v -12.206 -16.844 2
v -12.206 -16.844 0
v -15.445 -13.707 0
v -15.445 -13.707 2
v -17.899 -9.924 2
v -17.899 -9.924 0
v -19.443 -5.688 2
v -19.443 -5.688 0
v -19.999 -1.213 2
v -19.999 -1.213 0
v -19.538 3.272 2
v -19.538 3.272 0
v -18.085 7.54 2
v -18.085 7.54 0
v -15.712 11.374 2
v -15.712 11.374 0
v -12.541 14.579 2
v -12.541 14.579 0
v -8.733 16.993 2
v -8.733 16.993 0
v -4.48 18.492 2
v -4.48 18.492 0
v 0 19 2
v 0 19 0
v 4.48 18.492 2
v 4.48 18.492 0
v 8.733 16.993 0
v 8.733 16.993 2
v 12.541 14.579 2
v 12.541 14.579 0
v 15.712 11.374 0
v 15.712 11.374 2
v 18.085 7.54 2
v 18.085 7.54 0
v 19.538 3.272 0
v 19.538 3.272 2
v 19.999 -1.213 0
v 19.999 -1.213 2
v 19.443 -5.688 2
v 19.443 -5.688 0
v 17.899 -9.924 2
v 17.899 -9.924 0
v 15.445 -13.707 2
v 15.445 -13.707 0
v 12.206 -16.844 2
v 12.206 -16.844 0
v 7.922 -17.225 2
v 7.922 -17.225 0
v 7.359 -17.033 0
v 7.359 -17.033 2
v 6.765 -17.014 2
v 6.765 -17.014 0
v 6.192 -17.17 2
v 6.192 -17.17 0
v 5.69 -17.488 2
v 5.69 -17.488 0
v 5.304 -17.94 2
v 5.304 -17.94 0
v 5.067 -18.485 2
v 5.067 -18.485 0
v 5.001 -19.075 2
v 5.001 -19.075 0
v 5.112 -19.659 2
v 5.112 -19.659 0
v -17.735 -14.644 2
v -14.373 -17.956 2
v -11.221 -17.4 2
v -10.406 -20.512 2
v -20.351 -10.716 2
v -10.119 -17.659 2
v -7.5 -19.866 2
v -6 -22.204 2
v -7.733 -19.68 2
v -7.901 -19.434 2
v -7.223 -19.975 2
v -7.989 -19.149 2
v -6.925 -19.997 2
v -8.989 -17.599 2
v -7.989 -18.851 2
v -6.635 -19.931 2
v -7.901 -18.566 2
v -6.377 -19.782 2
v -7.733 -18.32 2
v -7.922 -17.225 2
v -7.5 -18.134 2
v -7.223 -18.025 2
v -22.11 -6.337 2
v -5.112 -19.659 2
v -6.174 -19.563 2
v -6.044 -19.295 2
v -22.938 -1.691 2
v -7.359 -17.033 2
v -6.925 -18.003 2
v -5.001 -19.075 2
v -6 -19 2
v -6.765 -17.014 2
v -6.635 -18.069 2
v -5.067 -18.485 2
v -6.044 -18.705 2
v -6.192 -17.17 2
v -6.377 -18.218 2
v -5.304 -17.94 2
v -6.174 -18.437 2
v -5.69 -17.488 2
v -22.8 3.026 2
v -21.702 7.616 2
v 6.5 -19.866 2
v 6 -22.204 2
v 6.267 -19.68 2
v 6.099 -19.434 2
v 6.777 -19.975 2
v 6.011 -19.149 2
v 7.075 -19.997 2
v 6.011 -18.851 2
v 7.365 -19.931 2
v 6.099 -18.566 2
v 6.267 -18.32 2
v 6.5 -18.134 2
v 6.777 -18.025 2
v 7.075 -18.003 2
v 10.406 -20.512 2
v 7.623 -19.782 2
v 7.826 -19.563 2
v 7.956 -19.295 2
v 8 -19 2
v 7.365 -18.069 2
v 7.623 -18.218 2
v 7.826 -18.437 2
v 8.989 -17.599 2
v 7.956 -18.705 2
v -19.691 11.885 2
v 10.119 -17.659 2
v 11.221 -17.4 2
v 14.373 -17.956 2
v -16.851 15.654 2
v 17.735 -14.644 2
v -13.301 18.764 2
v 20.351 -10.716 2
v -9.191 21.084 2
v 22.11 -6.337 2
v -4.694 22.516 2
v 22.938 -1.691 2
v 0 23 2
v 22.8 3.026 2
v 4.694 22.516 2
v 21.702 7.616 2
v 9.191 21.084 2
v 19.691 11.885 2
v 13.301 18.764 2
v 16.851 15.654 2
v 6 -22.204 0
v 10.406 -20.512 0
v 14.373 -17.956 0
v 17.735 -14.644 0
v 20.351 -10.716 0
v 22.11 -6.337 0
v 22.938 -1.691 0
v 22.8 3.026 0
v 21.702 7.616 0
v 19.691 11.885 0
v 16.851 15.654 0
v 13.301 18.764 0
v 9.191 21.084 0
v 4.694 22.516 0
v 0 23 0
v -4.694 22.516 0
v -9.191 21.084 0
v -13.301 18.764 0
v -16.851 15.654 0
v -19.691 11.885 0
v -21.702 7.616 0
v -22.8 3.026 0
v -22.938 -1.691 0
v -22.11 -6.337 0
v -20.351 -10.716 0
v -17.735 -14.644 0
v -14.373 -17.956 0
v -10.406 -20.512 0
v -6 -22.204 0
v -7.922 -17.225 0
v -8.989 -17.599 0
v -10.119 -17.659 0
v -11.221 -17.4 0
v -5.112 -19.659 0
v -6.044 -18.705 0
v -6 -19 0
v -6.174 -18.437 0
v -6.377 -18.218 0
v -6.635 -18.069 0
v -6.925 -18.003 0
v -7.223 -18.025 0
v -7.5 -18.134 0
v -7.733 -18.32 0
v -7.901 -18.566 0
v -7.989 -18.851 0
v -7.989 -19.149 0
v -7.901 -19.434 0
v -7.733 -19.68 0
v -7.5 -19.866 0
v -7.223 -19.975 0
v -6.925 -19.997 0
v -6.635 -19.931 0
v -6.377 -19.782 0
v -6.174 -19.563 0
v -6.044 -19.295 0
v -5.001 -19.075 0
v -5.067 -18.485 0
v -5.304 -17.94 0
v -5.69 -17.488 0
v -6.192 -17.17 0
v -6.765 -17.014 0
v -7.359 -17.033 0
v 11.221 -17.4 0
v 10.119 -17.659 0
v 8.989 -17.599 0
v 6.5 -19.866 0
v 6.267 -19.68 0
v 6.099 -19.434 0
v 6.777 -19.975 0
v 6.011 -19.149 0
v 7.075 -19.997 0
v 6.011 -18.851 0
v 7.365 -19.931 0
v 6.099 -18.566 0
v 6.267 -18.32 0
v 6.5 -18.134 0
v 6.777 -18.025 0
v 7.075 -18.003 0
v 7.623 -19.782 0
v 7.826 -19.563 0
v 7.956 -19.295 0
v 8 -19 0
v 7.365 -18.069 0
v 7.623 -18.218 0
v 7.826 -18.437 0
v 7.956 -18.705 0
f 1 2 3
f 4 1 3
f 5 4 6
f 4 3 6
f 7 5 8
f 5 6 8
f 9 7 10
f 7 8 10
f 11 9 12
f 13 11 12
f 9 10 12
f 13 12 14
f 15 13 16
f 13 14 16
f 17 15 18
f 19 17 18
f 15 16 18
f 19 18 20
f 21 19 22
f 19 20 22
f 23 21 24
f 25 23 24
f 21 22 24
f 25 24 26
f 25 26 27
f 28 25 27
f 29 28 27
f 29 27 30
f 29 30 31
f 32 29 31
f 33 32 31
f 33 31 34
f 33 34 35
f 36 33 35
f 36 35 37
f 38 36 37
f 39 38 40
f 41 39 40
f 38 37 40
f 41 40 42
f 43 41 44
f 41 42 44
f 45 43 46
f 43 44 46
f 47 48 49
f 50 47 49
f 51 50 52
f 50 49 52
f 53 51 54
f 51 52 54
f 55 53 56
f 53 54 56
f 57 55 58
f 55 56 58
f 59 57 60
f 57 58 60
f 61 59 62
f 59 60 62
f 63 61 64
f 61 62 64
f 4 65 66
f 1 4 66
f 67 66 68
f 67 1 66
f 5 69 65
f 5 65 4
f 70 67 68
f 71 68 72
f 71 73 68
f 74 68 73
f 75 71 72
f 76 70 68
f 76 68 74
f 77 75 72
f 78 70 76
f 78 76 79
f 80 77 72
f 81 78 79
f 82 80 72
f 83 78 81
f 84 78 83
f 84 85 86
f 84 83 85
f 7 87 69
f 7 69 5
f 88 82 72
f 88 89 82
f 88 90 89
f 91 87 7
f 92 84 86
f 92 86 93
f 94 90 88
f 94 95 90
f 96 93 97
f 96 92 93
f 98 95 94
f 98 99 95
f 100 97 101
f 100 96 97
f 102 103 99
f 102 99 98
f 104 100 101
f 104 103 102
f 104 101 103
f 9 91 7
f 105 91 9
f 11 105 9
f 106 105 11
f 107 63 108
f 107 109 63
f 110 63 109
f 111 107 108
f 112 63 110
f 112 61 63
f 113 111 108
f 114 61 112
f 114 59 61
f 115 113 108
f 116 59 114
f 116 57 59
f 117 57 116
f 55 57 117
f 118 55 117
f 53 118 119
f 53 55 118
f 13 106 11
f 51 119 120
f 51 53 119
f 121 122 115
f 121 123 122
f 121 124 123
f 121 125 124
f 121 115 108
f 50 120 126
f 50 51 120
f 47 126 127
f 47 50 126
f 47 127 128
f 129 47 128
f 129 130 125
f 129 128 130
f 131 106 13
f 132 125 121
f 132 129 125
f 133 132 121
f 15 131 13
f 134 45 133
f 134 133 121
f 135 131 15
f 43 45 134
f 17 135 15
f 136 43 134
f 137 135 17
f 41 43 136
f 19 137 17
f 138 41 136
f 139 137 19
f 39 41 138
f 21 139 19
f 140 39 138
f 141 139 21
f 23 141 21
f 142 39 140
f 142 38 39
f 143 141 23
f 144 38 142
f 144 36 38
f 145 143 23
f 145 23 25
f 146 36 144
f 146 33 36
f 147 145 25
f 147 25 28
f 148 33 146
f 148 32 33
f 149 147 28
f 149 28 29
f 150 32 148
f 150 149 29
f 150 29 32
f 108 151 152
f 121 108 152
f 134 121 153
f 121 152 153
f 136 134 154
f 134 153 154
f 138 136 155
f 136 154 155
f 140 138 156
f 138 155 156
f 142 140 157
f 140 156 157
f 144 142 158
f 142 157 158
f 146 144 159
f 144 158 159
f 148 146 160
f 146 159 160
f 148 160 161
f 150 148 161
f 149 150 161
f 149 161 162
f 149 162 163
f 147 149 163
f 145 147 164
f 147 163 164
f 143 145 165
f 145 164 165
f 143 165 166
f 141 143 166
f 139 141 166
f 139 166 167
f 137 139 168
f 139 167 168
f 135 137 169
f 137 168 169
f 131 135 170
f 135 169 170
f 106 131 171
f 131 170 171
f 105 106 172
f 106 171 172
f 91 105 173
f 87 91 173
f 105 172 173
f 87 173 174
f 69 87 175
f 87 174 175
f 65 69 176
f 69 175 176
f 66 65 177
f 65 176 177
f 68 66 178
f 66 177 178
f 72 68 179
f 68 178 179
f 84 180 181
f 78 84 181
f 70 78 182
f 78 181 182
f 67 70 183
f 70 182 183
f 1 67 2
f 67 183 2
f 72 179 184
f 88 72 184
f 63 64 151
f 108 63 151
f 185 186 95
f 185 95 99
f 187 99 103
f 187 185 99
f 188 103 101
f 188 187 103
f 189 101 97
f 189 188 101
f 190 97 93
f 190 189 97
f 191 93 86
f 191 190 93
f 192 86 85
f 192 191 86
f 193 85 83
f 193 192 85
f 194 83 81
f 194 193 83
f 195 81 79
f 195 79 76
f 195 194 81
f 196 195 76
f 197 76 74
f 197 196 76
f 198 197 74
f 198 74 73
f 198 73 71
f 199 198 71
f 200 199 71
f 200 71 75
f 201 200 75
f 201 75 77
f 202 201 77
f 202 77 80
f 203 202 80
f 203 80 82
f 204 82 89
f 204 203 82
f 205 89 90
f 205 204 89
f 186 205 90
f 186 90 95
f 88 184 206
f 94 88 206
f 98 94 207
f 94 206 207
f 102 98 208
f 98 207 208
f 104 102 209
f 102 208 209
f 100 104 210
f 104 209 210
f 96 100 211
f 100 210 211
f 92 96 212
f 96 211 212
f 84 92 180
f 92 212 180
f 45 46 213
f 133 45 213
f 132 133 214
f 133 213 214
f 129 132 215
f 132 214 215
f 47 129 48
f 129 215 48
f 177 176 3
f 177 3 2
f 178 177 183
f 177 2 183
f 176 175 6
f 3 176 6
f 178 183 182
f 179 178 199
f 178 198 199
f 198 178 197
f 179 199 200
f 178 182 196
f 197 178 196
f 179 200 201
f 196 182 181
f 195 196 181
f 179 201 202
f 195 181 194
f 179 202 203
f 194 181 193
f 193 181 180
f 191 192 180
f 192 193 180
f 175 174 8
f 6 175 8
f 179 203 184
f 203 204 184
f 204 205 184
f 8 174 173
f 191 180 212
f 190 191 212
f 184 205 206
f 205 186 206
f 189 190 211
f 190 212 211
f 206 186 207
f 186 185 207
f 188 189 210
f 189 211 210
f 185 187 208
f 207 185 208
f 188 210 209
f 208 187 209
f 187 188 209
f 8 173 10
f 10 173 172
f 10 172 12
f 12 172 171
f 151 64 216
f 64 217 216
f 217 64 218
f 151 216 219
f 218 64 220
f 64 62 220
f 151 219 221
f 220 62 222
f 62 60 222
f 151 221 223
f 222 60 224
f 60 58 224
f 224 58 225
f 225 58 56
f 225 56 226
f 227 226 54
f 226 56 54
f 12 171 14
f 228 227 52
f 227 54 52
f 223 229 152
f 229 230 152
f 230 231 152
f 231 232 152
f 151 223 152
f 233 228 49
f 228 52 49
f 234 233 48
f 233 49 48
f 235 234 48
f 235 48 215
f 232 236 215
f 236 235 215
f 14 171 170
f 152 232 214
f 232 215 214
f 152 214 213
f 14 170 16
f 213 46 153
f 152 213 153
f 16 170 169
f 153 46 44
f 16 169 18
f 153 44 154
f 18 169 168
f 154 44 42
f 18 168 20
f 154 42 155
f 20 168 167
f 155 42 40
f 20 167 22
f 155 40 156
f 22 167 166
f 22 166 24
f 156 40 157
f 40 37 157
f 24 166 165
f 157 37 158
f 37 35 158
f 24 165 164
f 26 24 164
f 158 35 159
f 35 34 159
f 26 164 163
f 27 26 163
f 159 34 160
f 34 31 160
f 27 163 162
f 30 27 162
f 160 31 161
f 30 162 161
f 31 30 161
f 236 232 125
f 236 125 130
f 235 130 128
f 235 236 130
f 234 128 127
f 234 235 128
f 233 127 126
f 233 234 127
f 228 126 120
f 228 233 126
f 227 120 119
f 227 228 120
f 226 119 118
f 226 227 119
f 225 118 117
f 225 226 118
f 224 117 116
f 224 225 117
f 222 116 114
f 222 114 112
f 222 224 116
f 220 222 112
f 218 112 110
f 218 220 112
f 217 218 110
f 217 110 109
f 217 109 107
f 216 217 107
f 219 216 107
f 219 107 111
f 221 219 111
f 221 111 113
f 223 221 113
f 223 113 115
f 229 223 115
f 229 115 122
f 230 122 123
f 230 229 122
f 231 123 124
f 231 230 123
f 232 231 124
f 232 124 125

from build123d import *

# Parameters (mm, degrees)
SKETCH1_R           = 1
BOSS_EXTRUDE1_DEPTH = 2


with BuildPart() as part:
    # Sketch1 → Boss-Extrude1 (new body)
    with BuildSketch(Plane.XY):
        with BuildLine():
            Line((5.111751732, -19.659180157), (6, -22.203603311))
            ThreePointArc((6, -22.203603311), (0, 23), (-6, -22.203603311))
            Line((-6, -22.203603311), (-5.111751732, -19.659180157))
            ThreePointArc((-5.111751732, -19.659180157), (-5.690422868, -17.488375796), (-7.921535407, -17.224958453))
            ThreePointArc((-7.921535407, -17.224958453), (-10.119267773, -17.659121233), (-12.205757776, -16.843594198))
            ThreePointArc((-12.205757776, -16.843594198), (0, 19), (12.205757776, -16.843594198))
            ThreePointArc((12.205757776, -16.843594198), (10.119267773, -17.659121233), (7.921535407, -17.224958453))
            ThreePointArc((7.921535407, -17.224958453), (5.690422868, -17.488375796), (5.111751732, -19.659180157))
        make_face()
        with Locations((-7, -19)):
            Circle(SKETCH1_R, mode=Mode.SUBTRACT)
        with Locations((7, -19)):
            Circle(SKETCH1_R, mode=Mode.SUBTRACT)
    extrude(amount=BOSS_EXTRUDE1_DEPTH)


solid = part.part
